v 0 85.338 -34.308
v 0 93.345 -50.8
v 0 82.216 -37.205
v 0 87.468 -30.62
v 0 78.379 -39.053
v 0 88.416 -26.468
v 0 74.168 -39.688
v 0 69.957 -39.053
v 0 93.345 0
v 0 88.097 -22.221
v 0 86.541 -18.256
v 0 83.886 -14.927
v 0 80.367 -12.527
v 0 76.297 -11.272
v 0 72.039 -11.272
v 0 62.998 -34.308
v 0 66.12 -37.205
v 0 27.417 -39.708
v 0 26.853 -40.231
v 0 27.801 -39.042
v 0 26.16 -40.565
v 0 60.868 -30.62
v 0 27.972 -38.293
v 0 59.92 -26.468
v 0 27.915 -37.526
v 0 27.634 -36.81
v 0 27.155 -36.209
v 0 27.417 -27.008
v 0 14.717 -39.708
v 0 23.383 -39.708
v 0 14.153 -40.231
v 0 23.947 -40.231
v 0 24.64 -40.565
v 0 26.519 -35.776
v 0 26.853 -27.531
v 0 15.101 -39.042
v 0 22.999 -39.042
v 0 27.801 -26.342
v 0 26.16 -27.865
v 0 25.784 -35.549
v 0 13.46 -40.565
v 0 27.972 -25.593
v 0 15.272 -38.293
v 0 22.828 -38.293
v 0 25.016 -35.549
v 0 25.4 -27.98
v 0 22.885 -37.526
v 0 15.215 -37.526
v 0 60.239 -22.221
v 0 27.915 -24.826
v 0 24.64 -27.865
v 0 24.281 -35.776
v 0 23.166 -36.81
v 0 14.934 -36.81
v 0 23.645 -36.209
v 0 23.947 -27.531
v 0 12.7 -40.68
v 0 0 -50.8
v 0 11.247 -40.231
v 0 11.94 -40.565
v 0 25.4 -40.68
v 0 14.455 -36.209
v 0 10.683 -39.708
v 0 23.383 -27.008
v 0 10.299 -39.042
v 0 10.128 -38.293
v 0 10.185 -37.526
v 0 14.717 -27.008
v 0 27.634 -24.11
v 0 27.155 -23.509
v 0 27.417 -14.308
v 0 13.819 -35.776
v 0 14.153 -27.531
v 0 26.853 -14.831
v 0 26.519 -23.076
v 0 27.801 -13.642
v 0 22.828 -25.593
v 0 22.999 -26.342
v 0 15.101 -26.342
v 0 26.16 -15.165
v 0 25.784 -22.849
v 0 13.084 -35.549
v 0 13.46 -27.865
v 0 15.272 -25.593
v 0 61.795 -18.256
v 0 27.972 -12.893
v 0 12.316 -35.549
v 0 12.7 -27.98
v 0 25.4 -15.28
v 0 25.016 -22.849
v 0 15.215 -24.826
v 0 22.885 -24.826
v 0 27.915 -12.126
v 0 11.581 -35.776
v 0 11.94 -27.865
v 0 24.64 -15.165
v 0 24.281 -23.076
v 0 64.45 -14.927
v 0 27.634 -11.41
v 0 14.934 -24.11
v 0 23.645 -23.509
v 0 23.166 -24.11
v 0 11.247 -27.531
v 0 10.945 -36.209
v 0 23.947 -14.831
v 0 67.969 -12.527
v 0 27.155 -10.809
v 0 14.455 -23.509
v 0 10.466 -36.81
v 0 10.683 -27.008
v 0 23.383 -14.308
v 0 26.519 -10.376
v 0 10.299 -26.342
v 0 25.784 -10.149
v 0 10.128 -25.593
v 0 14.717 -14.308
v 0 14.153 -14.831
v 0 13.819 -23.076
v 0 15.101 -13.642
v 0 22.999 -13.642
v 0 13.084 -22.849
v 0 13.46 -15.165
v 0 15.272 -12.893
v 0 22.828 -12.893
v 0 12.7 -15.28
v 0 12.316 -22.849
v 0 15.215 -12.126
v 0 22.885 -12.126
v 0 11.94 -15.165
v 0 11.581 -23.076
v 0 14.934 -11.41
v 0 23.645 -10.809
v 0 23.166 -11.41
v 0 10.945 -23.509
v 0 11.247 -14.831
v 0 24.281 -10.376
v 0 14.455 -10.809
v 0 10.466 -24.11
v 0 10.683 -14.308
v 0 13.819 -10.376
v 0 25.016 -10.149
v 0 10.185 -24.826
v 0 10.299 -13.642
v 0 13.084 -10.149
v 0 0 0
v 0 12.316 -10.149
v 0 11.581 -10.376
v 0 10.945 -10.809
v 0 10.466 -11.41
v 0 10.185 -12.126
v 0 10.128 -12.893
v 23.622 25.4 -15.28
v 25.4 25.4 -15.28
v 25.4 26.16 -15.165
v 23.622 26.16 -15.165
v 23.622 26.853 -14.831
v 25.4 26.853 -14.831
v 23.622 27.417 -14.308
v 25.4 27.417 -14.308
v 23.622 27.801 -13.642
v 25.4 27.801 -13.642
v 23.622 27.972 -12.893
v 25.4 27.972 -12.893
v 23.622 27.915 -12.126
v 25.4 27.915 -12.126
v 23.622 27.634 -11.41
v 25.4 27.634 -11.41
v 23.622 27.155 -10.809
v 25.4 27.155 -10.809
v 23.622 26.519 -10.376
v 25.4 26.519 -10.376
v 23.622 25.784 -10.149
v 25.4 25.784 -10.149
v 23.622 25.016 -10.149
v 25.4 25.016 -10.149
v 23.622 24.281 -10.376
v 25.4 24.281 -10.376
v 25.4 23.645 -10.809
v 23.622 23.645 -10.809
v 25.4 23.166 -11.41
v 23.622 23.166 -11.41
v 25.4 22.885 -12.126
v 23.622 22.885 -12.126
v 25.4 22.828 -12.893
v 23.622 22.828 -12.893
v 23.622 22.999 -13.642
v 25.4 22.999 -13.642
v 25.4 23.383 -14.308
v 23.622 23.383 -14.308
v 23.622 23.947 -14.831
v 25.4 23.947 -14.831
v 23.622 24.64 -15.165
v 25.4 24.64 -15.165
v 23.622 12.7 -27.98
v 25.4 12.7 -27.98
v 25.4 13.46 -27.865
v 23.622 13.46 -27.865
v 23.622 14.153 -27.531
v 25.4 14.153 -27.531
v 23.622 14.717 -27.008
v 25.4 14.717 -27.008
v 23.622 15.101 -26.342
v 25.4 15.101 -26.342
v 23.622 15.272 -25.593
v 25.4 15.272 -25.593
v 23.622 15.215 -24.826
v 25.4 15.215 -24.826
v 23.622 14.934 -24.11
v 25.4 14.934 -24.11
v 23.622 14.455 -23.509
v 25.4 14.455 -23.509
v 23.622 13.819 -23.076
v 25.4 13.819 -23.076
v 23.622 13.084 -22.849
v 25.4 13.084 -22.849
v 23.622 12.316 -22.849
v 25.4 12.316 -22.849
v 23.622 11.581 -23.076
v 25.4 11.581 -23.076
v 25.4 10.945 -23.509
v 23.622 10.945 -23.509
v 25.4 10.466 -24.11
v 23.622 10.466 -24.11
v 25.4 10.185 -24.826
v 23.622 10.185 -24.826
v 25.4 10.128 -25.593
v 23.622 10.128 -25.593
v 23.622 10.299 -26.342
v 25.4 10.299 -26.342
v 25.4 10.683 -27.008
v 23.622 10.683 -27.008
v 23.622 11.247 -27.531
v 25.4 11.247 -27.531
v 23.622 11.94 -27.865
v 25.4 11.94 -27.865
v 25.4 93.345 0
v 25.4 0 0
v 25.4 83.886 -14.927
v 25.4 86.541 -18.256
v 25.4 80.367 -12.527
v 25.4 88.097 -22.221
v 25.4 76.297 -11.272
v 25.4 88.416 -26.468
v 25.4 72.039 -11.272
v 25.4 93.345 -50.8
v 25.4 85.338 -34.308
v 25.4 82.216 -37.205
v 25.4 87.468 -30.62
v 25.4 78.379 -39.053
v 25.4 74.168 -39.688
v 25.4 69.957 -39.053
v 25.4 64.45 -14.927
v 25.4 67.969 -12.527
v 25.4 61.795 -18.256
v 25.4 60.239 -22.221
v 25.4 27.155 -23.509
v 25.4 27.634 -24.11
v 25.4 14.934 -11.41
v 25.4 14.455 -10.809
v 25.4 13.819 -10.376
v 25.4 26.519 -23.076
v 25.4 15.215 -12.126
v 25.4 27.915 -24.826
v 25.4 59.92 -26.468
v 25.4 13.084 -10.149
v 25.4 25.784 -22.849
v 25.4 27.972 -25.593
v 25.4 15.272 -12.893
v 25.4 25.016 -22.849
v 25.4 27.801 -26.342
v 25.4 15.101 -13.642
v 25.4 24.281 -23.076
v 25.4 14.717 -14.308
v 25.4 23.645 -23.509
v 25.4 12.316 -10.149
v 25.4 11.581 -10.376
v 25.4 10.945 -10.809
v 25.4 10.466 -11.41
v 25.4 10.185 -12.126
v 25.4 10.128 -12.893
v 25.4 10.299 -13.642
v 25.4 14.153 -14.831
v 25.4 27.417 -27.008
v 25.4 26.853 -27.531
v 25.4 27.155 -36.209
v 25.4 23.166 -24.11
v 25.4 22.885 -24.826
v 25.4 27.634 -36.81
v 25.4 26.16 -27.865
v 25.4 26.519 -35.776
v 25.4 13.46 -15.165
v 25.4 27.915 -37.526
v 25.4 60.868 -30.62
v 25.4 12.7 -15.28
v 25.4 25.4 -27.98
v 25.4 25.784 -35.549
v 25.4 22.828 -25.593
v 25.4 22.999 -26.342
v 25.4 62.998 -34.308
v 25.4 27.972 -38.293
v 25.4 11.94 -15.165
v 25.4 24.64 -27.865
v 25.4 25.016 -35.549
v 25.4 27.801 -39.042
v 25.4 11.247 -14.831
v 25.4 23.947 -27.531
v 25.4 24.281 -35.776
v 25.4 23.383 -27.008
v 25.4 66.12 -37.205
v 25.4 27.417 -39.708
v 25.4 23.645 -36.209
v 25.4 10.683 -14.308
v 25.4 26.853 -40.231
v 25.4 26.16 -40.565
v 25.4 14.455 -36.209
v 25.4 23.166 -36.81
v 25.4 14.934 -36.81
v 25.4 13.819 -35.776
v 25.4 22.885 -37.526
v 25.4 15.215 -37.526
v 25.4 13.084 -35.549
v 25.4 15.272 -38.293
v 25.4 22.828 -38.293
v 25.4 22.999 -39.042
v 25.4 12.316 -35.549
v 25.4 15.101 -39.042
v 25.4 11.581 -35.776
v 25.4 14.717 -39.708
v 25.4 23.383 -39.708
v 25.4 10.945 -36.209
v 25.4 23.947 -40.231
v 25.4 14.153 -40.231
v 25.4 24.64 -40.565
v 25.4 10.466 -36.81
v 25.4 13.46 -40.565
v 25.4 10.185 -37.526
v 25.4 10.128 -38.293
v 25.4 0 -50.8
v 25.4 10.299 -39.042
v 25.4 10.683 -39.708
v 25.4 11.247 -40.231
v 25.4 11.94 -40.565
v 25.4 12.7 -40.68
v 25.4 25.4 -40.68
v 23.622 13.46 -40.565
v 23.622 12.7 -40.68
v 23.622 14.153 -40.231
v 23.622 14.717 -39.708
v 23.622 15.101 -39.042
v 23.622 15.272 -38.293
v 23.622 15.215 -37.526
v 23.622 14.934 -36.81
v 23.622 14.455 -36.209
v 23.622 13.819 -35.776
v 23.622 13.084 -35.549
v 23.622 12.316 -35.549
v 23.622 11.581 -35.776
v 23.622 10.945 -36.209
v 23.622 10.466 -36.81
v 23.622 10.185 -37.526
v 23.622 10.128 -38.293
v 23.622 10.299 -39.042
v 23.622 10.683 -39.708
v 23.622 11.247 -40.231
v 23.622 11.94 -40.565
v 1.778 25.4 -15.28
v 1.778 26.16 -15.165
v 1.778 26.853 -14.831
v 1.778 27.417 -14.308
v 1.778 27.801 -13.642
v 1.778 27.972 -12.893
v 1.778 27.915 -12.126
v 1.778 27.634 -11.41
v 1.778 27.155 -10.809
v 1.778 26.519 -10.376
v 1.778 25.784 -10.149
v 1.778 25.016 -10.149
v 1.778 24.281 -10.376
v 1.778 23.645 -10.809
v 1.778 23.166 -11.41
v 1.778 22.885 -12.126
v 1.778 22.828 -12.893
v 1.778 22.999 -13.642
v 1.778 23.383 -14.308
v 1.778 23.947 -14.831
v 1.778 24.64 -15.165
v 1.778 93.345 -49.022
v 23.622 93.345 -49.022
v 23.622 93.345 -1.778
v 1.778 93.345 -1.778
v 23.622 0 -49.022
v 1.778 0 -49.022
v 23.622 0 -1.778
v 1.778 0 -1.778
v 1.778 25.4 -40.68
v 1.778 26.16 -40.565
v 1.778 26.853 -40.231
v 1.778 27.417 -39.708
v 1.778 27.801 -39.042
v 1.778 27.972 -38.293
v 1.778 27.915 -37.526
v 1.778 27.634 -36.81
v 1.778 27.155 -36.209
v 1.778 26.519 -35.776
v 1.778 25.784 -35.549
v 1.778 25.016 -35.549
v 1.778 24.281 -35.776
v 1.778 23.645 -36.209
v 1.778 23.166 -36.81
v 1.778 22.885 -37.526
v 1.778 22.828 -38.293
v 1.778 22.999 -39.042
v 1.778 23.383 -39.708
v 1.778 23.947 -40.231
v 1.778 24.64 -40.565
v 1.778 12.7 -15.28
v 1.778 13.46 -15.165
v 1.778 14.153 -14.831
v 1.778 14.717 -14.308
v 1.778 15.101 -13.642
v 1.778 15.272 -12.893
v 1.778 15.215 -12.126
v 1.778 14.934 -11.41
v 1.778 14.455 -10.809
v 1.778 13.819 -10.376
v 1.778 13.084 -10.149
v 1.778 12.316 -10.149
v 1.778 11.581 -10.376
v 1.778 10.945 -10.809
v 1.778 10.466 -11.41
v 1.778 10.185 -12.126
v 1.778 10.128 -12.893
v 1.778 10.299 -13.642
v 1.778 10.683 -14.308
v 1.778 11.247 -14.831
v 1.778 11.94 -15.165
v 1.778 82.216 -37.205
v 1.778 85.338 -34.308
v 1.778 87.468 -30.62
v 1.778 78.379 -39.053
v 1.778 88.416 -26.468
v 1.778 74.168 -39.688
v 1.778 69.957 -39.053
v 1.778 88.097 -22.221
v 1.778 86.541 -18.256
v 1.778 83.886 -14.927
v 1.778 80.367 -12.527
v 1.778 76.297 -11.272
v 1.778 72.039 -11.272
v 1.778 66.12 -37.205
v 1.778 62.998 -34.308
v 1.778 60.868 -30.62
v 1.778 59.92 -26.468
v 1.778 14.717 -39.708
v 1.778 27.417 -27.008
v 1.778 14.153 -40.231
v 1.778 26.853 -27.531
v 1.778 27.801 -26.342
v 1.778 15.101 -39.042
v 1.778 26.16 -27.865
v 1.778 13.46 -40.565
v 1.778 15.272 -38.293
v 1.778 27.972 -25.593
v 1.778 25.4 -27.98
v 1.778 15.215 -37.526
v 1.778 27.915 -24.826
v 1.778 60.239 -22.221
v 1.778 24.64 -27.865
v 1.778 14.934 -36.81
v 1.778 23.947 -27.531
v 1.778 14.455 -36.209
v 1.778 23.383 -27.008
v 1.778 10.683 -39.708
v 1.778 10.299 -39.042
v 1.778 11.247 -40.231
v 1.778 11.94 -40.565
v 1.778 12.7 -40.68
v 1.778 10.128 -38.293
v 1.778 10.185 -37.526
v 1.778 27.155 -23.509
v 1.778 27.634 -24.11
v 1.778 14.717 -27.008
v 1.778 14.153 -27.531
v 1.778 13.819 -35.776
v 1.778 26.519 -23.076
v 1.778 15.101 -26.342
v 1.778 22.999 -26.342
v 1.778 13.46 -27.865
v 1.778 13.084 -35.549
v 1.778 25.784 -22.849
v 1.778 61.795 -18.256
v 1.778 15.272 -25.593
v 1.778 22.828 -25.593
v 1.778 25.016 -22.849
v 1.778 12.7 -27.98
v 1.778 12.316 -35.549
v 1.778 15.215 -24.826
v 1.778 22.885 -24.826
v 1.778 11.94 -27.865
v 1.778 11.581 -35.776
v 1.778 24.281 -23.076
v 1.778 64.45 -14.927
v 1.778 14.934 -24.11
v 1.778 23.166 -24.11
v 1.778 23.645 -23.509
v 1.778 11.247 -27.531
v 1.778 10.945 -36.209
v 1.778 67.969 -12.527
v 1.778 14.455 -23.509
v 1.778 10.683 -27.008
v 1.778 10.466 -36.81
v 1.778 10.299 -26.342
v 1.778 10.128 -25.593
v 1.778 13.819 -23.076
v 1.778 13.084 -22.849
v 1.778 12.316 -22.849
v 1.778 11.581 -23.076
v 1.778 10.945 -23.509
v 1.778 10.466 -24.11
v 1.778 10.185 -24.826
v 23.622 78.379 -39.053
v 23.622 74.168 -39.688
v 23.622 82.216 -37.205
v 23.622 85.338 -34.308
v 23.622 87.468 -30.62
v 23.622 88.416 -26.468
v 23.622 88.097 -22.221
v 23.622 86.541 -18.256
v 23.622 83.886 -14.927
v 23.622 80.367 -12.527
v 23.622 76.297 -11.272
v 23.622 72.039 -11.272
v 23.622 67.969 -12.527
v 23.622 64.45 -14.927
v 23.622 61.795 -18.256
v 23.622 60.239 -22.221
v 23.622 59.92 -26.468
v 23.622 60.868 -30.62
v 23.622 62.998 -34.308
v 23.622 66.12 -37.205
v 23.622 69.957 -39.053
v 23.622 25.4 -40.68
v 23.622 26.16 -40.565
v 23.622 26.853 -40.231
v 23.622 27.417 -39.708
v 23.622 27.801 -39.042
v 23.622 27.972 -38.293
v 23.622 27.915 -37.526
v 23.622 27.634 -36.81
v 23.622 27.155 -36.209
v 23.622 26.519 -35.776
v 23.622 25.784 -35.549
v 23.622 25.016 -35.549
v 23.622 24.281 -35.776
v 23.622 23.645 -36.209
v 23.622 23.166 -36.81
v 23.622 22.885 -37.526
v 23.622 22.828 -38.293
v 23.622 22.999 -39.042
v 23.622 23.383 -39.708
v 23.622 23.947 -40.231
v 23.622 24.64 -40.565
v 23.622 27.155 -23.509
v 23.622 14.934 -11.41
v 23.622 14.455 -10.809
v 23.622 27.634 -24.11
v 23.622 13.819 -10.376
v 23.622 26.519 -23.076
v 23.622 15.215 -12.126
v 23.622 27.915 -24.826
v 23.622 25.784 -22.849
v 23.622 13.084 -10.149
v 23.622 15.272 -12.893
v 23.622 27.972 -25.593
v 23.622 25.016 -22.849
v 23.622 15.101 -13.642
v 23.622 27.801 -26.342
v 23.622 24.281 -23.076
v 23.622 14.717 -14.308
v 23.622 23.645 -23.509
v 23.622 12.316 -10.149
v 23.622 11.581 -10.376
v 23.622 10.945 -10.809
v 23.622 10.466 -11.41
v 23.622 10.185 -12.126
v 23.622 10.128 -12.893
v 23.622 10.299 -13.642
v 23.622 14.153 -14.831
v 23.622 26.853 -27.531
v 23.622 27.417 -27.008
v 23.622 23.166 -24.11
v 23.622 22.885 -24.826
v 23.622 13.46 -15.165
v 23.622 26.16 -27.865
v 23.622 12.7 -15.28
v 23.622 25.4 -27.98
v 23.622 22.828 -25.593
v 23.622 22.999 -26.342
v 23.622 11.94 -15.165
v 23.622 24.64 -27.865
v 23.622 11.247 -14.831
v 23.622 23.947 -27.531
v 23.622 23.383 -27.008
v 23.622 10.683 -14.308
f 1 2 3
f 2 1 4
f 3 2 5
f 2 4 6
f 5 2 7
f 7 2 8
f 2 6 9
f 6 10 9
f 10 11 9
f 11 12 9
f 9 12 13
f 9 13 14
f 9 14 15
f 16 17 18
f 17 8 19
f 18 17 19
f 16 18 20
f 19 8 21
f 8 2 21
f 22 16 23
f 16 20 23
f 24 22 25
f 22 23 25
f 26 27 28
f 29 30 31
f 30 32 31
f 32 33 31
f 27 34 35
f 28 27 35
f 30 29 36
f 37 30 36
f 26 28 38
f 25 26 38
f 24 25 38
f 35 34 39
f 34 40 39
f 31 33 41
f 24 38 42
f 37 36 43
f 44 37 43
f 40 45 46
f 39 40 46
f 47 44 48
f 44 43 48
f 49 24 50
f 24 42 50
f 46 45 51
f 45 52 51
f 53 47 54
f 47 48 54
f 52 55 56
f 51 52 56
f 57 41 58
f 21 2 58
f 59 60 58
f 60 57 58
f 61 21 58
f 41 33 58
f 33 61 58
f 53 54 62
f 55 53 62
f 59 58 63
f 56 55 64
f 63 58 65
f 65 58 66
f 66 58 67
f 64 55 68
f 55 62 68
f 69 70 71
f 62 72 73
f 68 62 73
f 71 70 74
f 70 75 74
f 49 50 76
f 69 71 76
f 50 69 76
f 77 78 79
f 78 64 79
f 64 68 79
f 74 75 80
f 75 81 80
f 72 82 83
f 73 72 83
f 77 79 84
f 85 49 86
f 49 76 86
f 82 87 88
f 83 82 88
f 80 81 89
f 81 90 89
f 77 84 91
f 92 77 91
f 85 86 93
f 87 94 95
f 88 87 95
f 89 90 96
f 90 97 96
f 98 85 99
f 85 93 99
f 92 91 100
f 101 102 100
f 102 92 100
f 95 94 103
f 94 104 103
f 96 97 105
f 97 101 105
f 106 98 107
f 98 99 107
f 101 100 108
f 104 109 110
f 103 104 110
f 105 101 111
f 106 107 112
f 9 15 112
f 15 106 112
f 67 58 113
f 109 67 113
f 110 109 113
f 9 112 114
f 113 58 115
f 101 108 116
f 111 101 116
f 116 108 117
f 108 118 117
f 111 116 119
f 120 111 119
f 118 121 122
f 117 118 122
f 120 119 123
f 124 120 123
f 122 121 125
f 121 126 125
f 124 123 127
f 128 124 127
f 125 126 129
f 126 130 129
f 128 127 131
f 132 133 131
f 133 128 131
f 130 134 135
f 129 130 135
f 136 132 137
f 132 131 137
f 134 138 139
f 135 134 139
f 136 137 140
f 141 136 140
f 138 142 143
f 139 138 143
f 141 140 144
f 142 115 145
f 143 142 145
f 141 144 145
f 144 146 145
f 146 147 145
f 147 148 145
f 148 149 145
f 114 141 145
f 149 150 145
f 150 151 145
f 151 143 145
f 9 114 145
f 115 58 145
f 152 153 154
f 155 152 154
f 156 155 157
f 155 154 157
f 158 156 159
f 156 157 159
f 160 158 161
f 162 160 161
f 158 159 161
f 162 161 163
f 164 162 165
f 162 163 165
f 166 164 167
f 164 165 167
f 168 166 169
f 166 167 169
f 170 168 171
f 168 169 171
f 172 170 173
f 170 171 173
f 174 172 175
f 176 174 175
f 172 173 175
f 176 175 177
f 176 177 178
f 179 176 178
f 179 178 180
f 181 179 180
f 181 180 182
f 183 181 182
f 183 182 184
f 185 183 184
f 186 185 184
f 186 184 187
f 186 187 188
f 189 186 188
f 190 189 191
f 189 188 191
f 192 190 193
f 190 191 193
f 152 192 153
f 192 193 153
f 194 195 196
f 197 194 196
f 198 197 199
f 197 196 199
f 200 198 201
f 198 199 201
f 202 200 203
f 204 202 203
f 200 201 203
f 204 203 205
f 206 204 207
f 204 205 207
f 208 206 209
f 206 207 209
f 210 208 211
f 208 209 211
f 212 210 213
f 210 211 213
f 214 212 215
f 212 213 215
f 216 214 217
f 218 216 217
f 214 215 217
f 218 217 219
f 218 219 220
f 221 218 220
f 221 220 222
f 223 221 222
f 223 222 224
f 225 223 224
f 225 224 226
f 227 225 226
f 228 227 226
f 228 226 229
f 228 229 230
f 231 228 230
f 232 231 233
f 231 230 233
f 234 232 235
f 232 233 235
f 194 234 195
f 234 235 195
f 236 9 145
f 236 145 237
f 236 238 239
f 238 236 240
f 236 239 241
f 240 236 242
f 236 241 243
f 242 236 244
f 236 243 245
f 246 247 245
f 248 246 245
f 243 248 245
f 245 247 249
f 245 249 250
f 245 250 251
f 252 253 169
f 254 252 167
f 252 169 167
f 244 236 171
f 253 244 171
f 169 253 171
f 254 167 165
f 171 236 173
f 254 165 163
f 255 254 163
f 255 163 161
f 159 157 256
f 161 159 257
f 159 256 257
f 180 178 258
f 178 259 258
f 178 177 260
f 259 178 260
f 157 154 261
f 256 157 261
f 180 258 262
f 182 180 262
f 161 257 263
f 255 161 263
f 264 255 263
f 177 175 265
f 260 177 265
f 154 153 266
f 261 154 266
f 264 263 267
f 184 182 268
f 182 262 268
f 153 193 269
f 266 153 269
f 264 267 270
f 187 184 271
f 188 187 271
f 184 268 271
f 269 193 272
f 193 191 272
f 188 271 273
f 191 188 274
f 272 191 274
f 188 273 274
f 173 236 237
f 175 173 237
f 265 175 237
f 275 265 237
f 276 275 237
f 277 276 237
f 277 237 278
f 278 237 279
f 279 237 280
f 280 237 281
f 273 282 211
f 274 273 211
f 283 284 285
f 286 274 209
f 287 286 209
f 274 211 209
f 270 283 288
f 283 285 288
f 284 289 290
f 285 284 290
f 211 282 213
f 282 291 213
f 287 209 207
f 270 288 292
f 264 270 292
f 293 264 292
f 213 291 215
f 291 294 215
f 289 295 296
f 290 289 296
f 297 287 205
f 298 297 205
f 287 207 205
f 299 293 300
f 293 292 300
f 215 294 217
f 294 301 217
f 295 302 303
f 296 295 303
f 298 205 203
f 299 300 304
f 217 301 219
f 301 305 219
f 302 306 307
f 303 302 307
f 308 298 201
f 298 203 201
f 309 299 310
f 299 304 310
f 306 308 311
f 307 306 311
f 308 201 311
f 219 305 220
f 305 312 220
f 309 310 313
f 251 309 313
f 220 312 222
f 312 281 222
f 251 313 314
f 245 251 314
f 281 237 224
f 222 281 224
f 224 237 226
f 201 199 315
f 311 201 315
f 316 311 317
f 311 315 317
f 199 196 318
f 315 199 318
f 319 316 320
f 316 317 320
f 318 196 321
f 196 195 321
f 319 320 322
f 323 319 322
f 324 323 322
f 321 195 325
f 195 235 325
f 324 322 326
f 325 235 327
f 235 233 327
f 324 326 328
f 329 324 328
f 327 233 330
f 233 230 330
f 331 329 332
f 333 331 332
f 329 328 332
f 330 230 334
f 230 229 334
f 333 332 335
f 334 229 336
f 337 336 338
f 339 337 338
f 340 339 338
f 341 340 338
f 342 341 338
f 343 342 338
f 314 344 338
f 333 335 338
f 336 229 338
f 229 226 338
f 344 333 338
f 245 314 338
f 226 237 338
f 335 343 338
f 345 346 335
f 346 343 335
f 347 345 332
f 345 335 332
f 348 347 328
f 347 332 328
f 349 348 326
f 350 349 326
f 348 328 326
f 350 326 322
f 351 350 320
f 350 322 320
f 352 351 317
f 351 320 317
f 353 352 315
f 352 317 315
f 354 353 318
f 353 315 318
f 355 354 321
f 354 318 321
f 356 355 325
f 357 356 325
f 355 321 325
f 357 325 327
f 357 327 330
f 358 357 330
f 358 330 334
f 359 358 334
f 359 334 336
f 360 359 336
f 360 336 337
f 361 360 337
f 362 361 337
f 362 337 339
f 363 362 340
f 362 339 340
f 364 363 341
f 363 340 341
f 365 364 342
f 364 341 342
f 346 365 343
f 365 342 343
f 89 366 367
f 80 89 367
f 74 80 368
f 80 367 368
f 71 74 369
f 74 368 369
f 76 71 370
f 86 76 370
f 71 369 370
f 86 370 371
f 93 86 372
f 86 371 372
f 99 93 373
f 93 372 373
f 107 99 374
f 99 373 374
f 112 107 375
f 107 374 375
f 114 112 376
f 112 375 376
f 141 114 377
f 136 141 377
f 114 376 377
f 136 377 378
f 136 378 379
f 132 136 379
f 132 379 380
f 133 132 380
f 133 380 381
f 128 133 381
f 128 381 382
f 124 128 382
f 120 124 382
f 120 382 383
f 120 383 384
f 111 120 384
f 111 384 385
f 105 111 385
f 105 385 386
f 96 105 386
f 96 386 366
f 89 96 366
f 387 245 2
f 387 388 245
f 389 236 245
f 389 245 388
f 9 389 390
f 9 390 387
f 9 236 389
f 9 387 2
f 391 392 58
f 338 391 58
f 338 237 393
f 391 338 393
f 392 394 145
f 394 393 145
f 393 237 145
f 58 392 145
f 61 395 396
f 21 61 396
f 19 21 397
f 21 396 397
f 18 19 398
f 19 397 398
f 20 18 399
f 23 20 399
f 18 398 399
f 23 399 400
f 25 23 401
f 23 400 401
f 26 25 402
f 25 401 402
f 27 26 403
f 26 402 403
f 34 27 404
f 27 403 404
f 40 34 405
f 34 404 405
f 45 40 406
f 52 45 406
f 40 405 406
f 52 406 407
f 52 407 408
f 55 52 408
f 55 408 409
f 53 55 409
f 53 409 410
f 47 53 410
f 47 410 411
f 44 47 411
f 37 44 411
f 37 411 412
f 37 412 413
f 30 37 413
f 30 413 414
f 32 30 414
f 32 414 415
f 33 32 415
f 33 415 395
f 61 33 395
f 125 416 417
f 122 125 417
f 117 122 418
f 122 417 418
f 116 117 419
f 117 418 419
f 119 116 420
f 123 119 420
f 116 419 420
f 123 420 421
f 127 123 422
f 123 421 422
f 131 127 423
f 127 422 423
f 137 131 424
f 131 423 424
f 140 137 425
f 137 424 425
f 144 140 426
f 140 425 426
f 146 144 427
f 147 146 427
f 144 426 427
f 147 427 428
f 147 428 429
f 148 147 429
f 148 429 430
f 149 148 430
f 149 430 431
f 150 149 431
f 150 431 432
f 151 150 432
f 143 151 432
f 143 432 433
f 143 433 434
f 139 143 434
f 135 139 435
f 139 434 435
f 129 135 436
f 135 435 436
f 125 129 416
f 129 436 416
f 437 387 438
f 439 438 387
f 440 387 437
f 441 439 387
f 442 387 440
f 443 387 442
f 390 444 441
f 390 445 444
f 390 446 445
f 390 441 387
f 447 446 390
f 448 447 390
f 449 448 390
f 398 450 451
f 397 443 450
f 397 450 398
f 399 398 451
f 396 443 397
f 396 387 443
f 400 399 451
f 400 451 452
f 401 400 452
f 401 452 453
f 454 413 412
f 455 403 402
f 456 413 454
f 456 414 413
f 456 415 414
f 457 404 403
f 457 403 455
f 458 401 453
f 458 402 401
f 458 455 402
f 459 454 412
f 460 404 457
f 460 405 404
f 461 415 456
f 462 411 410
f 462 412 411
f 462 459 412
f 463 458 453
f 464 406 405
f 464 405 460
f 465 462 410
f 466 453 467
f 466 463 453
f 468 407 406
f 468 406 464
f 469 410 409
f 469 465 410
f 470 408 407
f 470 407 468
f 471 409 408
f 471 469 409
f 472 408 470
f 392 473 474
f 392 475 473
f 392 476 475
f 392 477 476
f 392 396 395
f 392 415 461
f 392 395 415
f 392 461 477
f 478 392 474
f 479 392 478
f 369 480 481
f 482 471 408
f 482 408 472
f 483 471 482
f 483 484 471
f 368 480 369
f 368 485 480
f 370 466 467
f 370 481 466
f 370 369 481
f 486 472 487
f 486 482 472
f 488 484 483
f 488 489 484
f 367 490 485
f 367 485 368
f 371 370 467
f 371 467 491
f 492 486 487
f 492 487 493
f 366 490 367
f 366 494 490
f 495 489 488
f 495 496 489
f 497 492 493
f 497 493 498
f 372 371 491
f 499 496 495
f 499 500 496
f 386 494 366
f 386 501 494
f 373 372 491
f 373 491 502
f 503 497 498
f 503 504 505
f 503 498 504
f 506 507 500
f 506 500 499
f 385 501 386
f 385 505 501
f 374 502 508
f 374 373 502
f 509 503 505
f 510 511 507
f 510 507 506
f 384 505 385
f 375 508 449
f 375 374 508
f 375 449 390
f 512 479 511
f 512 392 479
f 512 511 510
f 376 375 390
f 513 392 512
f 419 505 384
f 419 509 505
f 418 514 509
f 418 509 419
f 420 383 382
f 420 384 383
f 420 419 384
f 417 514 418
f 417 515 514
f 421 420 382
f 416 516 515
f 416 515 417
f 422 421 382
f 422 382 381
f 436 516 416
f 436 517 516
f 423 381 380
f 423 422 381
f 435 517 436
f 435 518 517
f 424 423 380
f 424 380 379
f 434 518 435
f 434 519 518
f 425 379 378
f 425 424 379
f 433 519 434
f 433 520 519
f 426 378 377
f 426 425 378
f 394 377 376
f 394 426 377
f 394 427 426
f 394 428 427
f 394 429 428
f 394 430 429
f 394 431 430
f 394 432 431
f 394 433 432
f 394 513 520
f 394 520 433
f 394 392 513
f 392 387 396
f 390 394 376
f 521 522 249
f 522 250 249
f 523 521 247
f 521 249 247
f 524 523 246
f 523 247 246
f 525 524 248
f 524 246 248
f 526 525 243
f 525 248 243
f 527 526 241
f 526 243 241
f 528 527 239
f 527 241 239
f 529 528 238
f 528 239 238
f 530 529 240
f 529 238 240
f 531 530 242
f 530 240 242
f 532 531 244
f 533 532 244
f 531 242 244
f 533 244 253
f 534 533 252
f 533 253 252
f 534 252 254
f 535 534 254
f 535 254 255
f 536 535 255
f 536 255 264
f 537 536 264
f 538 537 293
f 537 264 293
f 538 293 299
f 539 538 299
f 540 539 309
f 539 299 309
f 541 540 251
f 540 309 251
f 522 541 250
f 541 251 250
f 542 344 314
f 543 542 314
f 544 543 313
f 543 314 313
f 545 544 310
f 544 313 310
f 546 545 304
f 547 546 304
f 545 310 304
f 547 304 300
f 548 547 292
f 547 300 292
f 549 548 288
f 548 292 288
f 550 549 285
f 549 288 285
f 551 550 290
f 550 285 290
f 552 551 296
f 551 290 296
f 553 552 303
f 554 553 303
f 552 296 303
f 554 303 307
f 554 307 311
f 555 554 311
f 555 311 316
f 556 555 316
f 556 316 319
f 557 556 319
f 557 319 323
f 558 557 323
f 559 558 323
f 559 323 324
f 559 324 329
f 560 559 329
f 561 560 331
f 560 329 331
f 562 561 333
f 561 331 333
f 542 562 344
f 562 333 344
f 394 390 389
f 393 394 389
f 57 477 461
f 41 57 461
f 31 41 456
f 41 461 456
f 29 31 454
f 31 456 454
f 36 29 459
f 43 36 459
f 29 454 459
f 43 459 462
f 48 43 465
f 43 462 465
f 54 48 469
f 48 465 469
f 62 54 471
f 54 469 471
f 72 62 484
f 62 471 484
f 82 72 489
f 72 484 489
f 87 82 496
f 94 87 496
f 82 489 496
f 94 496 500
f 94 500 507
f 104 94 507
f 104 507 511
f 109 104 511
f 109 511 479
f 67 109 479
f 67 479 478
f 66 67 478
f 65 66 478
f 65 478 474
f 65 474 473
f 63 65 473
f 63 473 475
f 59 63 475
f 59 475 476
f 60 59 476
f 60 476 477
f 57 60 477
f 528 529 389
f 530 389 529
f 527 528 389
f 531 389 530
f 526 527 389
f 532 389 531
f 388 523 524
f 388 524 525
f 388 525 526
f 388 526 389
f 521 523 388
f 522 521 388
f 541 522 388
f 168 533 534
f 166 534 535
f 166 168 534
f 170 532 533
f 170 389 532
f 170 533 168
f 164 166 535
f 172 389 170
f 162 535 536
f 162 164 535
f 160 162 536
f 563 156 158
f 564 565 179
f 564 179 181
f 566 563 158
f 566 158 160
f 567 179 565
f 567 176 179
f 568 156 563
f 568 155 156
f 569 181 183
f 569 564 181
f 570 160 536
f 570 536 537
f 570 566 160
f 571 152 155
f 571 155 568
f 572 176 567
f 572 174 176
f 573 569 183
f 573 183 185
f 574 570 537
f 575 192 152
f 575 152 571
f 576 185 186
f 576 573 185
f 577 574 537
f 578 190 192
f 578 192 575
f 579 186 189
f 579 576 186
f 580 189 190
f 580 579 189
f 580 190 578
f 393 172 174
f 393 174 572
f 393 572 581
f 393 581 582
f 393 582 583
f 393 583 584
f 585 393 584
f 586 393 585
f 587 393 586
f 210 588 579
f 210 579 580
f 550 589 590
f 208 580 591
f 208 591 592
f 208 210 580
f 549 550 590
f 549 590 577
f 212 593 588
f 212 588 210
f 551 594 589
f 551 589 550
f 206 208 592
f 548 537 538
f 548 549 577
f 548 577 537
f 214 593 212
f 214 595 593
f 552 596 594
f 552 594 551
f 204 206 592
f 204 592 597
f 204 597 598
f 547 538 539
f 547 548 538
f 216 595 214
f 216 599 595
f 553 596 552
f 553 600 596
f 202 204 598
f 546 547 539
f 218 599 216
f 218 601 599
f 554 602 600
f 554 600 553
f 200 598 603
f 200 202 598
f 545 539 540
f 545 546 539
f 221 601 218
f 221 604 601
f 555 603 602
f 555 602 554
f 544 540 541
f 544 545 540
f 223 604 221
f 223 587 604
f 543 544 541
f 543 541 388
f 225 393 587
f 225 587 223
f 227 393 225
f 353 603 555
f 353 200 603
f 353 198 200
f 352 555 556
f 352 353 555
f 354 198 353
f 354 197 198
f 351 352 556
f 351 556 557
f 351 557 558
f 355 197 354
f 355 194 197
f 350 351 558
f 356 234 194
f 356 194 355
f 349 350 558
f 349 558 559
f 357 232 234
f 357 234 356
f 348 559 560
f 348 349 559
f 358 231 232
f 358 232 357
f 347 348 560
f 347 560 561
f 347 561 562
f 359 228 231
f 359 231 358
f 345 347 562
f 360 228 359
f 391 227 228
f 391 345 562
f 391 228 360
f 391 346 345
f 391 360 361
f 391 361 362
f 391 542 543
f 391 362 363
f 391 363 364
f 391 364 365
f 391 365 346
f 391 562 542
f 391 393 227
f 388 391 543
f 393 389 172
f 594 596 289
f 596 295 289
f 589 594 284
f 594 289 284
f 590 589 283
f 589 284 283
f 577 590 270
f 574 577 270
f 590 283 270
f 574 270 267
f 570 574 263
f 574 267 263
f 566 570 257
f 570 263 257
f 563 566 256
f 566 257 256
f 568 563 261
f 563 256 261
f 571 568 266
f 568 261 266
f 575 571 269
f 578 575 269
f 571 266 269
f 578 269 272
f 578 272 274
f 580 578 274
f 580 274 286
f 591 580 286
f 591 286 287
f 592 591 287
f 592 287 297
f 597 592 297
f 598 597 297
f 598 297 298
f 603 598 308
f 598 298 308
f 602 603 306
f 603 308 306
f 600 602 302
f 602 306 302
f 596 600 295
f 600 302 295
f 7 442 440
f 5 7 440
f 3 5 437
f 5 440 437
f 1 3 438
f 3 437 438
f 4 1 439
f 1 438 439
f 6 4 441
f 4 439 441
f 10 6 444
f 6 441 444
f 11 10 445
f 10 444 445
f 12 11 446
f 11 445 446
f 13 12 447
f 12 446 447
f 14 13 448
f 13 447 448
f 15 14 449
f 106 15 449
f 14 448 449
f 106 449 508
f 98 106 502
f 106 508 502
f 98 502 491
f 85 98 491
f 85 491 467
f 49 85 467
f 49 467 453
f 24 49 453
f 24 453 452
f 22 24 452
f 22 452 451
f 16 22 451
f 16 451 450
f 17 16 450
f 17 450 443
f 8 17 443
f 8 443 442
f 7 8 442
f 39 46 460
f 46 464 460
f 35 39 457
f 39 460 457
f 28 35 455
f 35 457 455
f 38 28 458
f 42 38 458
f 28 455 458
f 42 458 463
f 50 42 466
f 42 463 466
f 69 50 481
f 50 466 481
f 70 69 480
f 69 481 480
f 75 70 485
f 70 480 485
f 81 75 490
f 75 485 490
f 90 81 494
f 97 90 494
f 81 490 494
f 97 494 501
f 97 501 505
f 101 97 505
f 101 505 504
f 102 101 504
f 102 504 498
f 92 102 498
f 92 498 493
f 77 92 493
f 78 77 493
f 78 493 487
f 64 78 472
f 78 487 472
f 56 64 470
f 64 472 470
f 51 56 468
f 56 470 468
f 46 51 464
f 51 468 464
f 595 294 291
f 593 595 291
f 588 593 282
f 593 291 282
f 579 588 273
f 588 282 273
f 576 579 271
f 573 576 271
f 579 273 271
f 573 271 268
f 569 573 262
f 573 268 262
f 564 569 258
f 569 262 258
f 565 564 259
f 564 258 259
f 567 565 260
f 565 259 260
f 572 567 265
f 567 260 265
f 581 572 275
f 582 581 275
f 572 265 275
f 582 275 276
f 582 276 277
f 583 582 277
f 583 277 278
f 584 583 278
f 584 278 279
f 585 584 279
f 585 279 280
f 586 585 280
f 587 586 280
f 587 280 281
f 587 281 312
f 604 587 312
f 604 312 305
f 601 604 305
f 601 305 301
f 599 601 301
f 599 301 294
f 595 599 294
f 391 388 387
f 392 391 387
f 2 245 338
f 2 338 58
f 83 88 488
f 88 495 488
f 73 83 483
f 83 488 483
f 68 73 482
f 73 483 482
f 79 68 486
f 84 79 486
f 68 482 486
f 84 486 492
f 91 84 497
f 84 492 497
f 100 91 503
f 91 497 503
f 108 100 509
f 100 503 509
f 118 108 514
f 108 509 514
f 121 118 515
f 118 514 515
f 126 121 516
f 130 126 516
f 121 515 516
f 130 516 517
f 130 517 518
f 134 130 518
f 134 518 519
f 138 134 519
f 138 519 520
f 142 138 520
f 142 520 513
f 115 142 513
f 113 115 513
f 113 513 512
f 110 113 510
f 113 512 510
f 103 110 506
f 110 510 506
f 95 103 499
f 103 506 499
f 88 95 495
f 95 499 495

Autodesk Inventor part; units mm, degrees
ref_plane "YZ Plane" through (0, 0, 0) normal (1, 0, 0) x (0, 1, 0)
ref_plane "XZ Plane" through (0, 0, 0) normal (0, 1, 0) x (-1, 0, 0)
ref_plane "XY Plane" through (0, 0, 0) normal (0, 0, 1) x (1, 0, 0)
sketch "Sketch2" plane through (0, 0, 0) normal (0, 1, 0) x (-1, 0, 0)
  line L0 (0, 0) -> (-25.4, 0)
  line L1 (-25.4, 0) -> (-25.4, -50.8)
  line L2 (-25.4, -50.8) -> (0, -50.8)
  line L3 (0, -50.8) -> (0, 0)
  line L4 (-1.778, -1.778) -> (-23.622, -1.778)
  line L5 (-23.622, -1.778) -> (-23.622, -49.022)
  line L6 (-23.622, -49.022) -> (-1.778, -49.022)
  line L7 (-1.778, -49.022) -> (-1.778, -1.778)
  dimension "d0" = 25.4
  dimension "d1" = 50.8
  dimension "d2" = 1.778
extrude "Extrusion1" add sketch "Sketch2" along normal blind 93.345
sketch "Sketch3" plane through (25.4, 0, 0) normal (1, 0, 0) x (0, 0, -1)
  line L0 (1.778, 0) -> (49.022, 0) construction
  line L1 (25.4, 0) -> (25.4, 48.768) construction
  line L2 (25.4, 48.768) -> (25.4, 74.168) construction
  circle A0 centre (25.4, 74.168) radius 14.2875
  point P0 (0, 0)
  dimension "d5" = 48.768
  dimension "d6" = 25.4
  dimension "d7" = 28.575
extrude "Extrusion2" cut sketch "Sketch3" against normal blind 42.545
sketch "Sketch4" plane through (25.4, 0, 0) normal (1, 0, 0) x (0, 0, -1)
  line L0 (0, 0) -> (12.7, 0) construction
  line L1 (50.8, 0) -> (0, 0) construction
  line L2 (12.7, 0) -> (25.4, 0) construction
  line L3 (25.4, 0) -> (38.1, 0) construction
  line L4 (12.7, 0) -> (12.7, 12.7) construction
  line L5 (12.7, 12.7) -> (12.7, 25.4) construction
  circle A0 centre (12.7, 25.4) radius 2.5797
  circle A1 centre (12.7, 12.7) radius 2.5797
  line L6 (12.7, 25.4) -> (25.4, 25.4) construction
  line L7 (25.4, 25.4) -> (38.1, 25.4) construction
  line L8 (25.4, 12.7) -> (25.4, 25.4) construction
  circle A2 centre (25.4, 25.4) radius 2.5797
  circle A3 centre (25.4, 12.7) radius 2.5797
  line L9 (38.1, 12.7) -> (38.1, 25.4) construction
  circle A4 centre (38.1, 25.4) radius 2.5797
  circle A5 centre (38.1, 12.7) radius 2.5797
  dimension "d10" = 12.7
  dimension "d11" = 12.7
  dimension "d12" = 12.7
  dimension "d13" = 12.7
  dimension "d14" = 12.7
  dimension "d15" = 5.1594
  dimension "d16" = 5.1594
  dimension "d17" = 12.7
  dimension "d27" = 12.7
  dimension "d28" = 12.7
  dimension "d29" = 5.1594
  dimension "d30" = 5.1594
  dimension "d31" = 12.7
  dimension "d32" = 5.1594
  dimension "d33" = 5.1594
extrude "Extrusion3" cut sketch "Sketch4" against normal blind 25.4
properties part number "anchor point"
